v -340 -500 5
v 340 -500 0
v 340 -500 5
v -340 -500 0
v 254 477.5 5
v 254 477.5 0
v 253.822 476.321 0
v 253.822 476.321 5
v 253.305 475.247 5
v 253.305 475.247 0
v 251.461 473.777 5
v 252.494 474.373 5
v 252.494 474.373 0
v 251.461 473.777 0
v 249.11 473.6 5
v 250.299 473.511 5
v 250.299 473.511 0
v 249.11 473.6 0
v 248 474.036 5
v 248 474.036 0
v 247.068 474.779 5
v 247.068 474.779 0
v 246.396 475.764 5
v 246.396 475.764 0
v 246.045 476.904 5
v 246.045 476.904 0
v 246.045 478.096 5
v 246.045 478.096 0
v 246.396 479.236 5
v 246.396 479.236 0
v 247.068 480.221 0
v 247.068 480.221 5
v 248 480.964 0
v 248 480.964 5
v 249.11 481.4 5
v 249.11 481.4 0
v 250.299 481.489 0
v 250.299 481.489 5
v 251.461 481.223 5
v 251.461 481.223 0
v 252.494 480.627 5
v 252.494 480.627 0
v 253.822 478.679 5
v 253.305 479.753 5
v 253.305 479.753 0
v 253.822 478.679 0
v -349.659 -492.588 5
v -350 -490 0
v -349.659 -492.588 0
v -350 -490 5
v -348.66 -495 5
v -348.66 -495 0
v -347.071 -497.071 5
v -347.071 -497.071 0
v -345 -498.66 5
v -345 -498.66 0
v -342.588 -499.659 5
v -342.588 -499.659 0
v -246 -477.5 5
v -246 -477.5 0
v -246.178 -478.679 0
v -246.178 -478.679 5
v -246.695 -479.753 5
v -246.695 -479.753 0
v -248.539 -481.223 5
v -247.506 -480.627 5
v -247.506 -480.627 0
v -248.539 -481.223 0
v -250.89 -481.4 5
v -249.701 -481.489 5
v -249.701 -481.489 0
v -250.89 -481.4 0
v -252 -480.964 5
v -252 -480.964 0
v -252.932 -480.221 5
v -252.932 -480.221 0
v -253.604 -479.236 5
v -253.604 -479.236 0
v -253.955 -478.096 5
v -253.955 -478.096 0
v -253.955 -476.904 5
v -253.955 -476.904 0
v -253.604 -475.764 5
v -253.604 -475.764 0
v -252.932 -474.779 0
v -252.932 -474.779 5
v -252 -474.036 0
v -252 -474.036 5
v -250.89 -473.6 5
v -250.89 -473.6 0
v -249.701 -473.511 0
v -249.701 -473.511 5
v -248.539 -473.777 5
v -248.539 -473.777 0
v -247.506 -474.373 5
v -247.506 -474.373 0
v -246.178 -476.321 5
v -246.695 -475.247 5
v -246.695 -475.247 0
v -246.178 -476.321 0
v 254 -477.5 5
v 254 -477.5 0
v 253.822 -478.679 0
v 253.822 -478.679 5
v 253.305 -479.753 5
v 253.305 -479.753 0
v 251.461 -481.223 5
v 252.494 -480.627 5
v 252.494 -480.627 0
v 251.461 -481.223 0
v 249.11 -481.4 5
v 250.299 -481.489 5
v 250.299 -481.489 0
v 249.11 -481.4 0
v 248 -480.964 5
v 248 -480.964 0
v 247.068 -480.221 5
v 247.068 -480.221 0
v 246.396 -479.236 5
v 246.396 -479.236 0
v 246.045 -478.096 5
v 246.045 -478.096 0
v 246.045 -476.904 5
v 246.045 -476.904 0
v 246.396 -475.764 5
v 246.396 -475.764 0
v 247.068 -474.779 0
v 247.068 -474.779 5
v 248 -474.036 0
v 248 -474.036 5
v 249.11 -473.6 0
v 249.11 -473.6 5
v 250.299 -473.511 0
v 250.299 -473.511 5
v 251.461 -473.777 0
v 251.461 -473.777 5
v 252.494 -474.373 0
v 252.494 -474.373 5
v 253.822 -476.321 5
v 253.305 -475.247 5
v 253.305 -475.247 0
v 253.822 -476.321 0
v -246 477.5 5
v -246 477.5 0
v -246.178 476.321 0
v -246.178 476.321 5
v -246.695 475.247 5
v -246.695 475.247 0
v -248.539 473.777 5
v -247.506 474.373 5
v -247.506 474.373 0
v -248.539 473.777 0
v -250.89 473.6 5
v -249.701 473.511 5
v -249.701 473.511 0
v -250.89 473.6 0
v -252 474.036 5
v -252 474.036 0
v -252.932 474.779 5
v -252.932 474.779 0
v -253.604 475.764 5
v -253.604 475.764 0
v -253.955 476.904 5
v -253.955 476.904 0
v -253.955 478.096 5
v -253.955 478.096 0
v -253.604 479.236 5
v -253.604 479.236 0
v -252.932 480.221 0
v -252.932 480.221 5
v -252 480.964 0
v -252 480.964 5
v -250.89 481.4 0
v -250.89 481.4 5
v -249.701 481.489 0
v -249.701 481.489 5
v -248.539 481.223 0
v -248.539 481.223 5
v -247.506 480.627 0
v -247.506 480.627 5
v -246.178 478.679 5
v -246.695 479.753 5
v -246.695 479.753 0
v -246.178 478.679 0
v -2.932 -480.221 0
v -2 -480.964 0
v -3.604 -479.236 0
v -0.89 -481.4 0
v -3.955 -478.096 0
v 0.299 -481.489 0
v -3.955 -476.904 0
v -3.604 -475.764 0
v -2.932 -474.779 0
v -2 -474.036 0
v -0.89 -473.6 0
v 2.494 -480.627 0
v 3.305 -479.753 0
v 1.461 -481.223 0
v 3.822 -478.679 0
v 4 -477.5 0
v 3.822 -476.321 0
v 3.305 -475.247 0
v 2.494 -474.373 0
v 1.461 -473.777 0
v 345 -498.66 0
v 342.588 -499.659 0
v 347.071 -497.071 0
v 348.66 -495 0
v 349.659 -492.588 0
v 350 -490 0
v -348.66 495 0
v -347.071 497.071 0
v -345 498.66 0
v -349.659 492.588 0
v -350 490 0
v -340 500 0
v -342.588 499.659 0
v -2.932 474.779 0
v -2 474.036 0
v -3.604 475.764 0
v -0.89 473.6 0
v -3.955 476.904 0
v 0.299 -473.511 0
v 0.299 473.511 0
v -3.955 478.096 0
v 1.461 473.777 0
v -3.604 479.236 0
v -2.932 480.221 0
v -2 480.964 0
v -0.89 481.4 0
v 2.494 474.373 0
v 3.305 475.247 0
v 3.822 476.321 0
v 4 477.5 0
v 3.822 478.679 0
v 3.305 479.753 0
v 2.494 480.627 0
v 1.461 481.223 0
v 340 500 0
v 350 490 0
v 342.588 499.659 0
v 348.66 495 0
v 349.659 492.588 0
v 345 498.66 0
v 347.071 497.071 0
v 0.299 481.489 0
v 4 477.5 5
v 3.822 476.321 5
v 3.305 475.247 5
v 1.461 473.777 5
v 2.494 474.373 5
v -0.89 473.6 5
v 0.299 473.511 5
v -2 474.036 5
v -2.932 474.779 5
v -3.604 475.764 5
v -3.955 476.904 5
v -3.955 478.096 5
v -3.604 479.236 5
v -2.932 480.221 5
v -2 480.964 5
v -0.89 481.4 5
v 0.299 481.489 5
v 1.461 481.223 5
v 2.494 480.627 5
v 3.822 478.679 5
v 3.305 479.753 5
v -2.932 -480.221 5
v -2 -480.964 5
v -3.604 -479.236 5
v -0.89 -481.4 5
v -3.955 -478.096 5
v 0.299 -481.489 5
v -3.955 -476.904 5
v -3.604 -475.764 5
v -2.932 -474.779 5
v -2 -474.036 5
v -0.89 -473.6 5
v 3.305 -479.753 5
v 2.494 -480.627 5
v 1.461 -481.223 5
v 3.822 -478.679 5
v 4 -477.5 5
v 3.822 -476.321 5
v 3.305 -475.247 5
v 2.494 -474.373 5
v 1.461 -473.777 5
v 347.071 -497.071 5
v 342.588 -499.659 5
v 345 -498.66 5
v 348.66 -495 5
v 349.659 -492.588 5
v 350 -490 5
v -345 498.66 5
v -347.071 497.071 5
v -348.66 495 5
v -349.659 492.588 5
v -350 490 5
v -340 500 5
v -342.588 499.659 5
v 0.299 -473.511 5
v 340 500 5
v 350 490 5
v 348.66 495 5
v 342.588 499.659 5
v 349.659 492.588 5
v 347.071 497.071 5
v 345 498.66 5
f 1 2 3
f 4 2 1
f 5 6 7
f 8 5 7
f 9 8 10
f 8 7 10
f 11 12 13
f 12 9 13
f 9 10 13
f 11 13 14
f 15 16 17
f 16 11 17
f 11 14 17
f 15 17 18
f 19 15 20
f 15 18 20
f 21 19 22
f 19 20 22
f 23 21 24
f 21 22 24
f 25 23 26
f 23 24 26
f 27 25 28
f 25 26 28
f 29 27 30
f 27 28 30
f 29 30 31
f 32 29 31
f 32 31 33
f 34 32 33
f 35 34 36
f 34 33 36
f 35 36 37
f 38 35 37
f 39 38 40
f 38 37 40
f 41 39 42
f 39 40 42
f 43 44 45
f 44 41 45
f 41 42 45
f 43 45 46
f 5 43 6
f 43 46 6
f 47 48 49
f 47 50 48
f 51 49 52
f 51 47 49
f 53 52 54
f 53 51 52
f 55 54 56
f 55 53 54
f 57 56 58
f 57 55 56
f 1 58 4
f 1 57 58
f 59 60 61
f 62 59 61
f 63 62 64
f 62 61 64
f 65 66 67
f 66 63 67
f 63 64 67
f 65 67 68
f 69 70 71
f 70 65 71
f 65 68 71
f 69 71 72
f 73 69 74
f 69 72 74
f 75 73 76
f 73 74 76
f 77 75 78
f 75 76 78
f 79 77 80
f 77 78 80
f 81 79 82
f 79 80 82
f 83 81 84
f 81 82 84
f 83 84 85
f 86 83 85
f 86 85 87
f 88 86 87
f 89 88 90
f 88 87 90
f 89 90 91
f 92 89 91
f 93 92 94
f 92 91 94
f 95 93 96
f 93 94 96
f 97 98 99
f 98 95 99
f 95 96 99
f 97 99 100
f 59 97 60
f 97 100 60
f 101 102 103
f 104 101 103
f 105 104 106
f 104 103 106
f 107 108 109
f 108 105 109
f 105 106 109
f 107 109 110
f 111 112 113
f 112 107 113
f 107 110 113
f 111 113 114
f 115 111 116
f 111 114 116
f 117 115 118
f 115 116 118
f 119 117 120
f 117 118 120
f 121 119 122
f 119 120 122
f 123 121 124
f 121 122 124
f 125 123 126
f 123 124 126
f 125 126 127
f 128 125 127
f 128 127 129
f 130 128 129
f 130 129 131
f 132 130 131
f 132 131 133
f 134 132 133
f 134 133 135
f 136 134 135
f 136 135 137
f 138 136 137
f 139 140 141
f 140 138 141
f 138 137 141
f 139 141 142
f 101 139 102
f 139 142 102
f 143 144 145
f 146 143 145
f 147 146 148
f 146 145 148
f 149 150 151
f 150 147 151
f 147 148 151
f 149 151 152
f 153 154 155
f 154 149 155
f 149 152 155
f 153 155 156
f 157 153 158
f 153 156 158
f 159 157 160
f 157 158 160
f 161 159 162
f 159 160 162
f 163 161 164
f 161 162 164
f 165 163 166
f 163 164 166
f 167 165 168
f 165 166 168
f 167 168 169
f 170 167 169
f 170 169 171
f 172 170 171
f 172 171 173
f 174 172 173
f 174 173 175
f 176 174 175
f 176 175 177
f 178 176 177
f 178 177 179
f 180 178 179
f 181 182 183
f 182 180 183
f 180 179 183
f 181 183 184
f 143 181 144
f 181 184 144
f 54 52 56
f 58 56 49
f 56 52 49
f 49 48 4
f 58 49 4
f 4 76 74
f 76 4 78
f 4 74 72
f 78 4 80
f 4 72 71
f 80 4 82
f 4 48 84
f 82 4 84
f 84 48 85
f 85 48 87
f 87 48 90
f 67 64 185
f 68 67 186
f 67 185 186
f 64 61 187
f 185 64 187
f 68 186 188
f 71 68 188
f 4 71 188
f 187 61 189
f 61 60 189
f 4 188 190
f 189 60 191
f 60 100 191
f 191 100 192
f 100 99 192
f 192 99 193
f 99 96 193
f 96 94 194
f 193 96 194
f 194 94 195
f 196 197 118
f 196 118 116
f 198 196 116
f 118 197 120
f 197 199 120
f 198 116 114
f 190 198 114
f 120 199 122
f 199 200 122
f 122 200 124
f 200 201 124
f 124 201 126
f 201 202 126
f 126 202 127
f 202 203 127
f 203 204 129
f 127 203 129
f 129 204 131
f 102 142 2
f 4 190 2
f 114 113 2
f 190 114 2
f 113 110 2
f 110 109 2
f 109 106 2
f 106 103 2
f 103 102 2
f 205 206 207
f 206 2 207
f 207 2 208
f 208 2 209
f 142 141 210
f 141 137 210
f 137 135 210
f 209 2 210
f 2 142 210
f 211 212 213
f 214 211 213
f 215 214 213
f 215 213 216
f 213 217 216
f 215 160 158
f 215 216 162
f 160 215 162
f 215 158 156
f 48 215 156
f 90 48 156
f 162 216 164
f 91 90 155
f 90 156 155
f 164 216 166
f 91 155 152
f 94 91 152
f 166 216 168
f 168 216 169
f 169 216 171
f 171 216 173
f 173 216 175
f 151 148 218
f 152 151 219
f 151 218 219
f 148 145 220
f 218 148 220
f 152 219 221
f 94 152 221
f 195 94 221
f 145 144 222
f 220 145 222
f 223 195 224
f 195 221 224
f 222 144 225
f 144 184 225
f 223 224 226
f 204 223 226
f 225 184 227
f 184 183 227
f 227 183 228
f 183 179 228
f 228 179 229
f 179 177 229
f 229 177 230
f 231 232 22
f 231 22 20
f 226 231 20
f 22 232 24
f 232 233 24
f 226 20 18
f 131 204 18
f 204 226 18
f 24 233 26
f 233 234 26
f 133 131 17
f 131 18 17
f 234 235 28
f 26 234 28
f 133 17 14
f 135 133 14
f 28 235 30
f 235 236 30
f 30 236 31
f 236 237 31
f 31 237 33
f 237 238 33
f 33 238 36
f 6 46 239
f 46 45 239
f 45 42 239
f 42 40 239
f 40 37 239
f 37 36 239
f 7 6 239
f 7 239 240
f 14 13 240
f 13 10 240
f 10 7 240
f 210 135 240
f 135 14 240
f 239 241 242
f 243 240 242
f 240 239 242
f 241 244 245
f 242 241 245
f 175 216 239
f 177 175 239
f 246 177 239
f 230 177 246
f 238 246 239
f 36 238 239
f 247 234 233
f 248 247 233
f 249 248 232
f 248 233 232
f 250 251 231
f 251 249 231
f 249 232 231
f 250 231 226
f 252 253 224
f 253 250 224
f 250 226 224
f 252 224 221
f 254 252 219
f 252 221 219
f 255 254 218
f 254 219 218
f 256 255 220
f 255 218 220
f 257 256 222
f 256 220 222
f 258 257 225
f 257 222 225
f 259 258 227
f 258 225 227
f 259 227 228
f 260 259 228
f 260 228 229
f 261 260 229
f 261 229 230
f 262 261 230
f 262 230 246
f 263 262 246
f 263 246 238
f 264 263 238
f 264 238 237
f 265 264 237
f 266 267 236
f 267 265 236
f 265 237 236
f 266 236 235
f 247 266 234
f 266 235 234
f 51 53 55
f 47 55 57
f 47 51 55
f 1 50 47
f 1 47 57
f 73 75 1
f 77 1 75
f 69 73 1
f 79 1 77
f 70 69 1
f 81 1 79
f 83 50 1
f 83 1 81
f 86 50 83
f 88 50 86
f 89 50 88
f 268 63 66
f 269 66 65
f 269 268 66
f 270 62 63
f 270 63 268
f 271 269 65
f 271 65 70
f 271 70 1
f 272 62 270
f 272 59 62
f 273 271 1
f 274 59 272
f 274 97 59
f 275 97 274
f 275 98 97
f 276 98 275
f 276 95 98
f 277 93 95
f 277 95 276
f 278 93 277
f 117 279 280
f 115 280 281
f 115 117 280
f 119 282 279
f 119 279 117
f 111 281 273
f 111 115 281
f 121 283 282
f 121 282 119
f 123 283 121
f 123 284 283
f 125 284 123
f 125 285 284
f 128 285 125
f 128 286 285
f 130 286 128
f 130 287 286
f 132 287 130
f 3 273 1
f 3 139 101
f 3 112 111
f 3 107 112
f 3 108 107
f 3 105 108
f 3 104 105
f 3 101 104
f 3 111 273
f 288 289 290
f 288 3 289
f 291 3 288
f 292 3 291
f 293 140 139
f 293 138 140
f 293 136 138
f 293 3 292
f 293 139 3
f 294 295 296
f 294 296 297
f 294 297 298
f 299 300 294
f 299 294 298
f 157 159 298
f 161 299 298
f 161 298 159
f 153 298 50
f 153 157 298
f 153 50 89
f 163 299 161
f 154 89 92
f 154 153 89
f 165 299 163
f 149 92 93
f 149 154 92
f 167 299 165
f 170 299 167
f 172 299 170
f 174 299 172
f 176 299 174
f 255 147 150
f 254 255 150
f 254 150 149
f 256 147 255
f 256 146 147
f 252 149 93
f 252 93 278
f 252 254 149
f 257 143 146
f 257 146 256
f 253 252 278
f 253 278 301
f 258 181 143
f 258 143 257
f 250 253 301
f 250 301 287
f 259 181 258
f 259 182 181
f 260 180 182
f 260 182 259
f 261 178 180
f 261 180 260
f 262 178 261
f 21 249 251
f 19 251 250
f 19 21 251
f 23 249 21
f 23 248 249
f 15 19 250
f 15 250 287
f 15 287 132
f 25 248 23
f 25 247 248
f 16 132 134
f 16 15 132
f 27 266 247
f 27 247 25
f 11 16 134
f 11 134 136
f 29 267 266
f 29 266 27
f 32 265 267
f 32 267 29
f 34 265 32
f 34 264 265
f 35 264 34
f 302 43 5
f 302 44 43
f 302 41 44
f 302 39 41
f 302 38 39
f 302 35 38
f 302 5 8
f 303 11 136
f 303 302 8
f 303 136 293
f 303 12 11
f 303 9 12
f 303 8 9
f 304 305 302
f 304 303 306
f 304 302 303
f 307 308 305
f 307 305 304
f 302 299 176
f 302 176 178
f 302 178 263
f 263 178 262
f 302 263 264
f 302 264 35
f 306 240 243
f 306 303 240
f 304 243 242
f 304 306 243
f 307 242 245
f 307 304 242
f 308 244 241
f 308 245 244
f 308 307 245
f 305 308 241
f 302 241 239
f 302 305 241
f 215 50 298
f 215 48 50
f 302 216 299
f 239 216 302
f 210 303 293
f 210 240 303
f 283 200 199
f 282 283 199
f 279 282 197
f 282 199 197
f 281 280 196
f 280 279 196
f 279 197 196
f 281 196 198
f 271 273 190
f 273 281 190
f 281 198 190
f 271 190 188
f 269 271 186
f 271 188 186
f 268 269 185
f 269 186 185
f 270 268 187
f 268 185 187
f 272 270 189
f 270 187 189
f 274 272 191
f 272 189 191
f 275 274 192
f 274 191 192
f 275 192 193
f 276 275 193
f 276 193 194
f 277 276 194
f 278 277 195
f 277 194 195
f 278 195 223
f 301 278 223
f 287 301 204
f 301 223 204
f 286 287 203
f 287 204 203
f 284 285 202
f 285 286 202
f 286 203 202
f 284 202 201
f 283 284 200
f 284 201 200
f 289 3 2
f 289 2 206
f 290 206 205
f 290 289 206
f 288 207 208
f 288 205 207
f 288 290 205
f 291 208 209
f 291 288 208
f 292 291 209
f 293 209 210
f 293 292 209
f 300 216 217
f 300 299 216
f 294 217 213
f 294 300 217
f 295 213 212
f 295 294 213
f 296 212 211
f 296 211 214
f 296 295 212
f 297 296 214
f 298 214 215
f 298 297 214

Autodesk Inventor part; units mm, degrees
ref_plane "YZ Plane" through (0, 0, 0) normal (1, 0, 0) x (0, 1, 0)
ref_plane "XZ Plane" through (0, 0, 0) normal (0, 1, 0) x (-1, 0, 0)
ref_plane "XY Plane" through (0, 0, 0) normal (0, 0, 1) x (1, 0, 0)
sketch "Boceto1" plane through (0, 0, 0) normal (0, 0, 1) x (1, 0, 0)
  line L0 (-350, 500) -> (350, 500)
  line L1 (350, 500) -> (350, -500)
  line L2 (350, -500) -> (-350, -500)
  line L3 (-350, -500) -> (-350, 500)
  circle A0 centre (-250, 477.5) radius 4
  circle A1 centre (250, 477.5) radius 4
  circle A2 centre (0, 477.5) radius 4
  circle A3 centre (-250, -477.5) radius 4
  circle A4 centre (0, -477.5) radius 4
  circle A5 centre (250, -477.5) radius 4
  circle A6 centre (-327.5, 240) radius 4
  circle A7 centre (-327.5, 0) radius 4
  circle A8 centre (-327.5, -240) radius 4
  point P0 (0, 0)
  point P1 (0, 500)
  point P2 (350, 0)
  point P3 (-350, 0)
  dimension "d0" = 700
  dimension "d4" = 1000
  dimension "d5" = 8
  dimension "d6" = 22.5
  dimension "d7" = 100
  dimension "d8" = 100
  dimension "d9" = 250
  dimension "d11" = 22.5
  dimension "d12" = 22.5
  dimension "d14" = 240
  dimension "d15" = 240
extrude "Extrusión1" add sketch "Boceto1" along normal blind 5 contours L0 L1 L2 L3 | A6 | A7 | A8
fillet "Empalme1" radius 10 4 edges at (350, 500, 2.5) (-350, 500, 2.5) (350, -500, 2.5) (-350, -500, 2.5)
equation "\"d8\" = d7"
equation "\"d11\" = d6"
equation "\"d12\" = d11"
equation "\"d15\" = d14"
properties part number "700x1000" material "Hierro, fundido"
